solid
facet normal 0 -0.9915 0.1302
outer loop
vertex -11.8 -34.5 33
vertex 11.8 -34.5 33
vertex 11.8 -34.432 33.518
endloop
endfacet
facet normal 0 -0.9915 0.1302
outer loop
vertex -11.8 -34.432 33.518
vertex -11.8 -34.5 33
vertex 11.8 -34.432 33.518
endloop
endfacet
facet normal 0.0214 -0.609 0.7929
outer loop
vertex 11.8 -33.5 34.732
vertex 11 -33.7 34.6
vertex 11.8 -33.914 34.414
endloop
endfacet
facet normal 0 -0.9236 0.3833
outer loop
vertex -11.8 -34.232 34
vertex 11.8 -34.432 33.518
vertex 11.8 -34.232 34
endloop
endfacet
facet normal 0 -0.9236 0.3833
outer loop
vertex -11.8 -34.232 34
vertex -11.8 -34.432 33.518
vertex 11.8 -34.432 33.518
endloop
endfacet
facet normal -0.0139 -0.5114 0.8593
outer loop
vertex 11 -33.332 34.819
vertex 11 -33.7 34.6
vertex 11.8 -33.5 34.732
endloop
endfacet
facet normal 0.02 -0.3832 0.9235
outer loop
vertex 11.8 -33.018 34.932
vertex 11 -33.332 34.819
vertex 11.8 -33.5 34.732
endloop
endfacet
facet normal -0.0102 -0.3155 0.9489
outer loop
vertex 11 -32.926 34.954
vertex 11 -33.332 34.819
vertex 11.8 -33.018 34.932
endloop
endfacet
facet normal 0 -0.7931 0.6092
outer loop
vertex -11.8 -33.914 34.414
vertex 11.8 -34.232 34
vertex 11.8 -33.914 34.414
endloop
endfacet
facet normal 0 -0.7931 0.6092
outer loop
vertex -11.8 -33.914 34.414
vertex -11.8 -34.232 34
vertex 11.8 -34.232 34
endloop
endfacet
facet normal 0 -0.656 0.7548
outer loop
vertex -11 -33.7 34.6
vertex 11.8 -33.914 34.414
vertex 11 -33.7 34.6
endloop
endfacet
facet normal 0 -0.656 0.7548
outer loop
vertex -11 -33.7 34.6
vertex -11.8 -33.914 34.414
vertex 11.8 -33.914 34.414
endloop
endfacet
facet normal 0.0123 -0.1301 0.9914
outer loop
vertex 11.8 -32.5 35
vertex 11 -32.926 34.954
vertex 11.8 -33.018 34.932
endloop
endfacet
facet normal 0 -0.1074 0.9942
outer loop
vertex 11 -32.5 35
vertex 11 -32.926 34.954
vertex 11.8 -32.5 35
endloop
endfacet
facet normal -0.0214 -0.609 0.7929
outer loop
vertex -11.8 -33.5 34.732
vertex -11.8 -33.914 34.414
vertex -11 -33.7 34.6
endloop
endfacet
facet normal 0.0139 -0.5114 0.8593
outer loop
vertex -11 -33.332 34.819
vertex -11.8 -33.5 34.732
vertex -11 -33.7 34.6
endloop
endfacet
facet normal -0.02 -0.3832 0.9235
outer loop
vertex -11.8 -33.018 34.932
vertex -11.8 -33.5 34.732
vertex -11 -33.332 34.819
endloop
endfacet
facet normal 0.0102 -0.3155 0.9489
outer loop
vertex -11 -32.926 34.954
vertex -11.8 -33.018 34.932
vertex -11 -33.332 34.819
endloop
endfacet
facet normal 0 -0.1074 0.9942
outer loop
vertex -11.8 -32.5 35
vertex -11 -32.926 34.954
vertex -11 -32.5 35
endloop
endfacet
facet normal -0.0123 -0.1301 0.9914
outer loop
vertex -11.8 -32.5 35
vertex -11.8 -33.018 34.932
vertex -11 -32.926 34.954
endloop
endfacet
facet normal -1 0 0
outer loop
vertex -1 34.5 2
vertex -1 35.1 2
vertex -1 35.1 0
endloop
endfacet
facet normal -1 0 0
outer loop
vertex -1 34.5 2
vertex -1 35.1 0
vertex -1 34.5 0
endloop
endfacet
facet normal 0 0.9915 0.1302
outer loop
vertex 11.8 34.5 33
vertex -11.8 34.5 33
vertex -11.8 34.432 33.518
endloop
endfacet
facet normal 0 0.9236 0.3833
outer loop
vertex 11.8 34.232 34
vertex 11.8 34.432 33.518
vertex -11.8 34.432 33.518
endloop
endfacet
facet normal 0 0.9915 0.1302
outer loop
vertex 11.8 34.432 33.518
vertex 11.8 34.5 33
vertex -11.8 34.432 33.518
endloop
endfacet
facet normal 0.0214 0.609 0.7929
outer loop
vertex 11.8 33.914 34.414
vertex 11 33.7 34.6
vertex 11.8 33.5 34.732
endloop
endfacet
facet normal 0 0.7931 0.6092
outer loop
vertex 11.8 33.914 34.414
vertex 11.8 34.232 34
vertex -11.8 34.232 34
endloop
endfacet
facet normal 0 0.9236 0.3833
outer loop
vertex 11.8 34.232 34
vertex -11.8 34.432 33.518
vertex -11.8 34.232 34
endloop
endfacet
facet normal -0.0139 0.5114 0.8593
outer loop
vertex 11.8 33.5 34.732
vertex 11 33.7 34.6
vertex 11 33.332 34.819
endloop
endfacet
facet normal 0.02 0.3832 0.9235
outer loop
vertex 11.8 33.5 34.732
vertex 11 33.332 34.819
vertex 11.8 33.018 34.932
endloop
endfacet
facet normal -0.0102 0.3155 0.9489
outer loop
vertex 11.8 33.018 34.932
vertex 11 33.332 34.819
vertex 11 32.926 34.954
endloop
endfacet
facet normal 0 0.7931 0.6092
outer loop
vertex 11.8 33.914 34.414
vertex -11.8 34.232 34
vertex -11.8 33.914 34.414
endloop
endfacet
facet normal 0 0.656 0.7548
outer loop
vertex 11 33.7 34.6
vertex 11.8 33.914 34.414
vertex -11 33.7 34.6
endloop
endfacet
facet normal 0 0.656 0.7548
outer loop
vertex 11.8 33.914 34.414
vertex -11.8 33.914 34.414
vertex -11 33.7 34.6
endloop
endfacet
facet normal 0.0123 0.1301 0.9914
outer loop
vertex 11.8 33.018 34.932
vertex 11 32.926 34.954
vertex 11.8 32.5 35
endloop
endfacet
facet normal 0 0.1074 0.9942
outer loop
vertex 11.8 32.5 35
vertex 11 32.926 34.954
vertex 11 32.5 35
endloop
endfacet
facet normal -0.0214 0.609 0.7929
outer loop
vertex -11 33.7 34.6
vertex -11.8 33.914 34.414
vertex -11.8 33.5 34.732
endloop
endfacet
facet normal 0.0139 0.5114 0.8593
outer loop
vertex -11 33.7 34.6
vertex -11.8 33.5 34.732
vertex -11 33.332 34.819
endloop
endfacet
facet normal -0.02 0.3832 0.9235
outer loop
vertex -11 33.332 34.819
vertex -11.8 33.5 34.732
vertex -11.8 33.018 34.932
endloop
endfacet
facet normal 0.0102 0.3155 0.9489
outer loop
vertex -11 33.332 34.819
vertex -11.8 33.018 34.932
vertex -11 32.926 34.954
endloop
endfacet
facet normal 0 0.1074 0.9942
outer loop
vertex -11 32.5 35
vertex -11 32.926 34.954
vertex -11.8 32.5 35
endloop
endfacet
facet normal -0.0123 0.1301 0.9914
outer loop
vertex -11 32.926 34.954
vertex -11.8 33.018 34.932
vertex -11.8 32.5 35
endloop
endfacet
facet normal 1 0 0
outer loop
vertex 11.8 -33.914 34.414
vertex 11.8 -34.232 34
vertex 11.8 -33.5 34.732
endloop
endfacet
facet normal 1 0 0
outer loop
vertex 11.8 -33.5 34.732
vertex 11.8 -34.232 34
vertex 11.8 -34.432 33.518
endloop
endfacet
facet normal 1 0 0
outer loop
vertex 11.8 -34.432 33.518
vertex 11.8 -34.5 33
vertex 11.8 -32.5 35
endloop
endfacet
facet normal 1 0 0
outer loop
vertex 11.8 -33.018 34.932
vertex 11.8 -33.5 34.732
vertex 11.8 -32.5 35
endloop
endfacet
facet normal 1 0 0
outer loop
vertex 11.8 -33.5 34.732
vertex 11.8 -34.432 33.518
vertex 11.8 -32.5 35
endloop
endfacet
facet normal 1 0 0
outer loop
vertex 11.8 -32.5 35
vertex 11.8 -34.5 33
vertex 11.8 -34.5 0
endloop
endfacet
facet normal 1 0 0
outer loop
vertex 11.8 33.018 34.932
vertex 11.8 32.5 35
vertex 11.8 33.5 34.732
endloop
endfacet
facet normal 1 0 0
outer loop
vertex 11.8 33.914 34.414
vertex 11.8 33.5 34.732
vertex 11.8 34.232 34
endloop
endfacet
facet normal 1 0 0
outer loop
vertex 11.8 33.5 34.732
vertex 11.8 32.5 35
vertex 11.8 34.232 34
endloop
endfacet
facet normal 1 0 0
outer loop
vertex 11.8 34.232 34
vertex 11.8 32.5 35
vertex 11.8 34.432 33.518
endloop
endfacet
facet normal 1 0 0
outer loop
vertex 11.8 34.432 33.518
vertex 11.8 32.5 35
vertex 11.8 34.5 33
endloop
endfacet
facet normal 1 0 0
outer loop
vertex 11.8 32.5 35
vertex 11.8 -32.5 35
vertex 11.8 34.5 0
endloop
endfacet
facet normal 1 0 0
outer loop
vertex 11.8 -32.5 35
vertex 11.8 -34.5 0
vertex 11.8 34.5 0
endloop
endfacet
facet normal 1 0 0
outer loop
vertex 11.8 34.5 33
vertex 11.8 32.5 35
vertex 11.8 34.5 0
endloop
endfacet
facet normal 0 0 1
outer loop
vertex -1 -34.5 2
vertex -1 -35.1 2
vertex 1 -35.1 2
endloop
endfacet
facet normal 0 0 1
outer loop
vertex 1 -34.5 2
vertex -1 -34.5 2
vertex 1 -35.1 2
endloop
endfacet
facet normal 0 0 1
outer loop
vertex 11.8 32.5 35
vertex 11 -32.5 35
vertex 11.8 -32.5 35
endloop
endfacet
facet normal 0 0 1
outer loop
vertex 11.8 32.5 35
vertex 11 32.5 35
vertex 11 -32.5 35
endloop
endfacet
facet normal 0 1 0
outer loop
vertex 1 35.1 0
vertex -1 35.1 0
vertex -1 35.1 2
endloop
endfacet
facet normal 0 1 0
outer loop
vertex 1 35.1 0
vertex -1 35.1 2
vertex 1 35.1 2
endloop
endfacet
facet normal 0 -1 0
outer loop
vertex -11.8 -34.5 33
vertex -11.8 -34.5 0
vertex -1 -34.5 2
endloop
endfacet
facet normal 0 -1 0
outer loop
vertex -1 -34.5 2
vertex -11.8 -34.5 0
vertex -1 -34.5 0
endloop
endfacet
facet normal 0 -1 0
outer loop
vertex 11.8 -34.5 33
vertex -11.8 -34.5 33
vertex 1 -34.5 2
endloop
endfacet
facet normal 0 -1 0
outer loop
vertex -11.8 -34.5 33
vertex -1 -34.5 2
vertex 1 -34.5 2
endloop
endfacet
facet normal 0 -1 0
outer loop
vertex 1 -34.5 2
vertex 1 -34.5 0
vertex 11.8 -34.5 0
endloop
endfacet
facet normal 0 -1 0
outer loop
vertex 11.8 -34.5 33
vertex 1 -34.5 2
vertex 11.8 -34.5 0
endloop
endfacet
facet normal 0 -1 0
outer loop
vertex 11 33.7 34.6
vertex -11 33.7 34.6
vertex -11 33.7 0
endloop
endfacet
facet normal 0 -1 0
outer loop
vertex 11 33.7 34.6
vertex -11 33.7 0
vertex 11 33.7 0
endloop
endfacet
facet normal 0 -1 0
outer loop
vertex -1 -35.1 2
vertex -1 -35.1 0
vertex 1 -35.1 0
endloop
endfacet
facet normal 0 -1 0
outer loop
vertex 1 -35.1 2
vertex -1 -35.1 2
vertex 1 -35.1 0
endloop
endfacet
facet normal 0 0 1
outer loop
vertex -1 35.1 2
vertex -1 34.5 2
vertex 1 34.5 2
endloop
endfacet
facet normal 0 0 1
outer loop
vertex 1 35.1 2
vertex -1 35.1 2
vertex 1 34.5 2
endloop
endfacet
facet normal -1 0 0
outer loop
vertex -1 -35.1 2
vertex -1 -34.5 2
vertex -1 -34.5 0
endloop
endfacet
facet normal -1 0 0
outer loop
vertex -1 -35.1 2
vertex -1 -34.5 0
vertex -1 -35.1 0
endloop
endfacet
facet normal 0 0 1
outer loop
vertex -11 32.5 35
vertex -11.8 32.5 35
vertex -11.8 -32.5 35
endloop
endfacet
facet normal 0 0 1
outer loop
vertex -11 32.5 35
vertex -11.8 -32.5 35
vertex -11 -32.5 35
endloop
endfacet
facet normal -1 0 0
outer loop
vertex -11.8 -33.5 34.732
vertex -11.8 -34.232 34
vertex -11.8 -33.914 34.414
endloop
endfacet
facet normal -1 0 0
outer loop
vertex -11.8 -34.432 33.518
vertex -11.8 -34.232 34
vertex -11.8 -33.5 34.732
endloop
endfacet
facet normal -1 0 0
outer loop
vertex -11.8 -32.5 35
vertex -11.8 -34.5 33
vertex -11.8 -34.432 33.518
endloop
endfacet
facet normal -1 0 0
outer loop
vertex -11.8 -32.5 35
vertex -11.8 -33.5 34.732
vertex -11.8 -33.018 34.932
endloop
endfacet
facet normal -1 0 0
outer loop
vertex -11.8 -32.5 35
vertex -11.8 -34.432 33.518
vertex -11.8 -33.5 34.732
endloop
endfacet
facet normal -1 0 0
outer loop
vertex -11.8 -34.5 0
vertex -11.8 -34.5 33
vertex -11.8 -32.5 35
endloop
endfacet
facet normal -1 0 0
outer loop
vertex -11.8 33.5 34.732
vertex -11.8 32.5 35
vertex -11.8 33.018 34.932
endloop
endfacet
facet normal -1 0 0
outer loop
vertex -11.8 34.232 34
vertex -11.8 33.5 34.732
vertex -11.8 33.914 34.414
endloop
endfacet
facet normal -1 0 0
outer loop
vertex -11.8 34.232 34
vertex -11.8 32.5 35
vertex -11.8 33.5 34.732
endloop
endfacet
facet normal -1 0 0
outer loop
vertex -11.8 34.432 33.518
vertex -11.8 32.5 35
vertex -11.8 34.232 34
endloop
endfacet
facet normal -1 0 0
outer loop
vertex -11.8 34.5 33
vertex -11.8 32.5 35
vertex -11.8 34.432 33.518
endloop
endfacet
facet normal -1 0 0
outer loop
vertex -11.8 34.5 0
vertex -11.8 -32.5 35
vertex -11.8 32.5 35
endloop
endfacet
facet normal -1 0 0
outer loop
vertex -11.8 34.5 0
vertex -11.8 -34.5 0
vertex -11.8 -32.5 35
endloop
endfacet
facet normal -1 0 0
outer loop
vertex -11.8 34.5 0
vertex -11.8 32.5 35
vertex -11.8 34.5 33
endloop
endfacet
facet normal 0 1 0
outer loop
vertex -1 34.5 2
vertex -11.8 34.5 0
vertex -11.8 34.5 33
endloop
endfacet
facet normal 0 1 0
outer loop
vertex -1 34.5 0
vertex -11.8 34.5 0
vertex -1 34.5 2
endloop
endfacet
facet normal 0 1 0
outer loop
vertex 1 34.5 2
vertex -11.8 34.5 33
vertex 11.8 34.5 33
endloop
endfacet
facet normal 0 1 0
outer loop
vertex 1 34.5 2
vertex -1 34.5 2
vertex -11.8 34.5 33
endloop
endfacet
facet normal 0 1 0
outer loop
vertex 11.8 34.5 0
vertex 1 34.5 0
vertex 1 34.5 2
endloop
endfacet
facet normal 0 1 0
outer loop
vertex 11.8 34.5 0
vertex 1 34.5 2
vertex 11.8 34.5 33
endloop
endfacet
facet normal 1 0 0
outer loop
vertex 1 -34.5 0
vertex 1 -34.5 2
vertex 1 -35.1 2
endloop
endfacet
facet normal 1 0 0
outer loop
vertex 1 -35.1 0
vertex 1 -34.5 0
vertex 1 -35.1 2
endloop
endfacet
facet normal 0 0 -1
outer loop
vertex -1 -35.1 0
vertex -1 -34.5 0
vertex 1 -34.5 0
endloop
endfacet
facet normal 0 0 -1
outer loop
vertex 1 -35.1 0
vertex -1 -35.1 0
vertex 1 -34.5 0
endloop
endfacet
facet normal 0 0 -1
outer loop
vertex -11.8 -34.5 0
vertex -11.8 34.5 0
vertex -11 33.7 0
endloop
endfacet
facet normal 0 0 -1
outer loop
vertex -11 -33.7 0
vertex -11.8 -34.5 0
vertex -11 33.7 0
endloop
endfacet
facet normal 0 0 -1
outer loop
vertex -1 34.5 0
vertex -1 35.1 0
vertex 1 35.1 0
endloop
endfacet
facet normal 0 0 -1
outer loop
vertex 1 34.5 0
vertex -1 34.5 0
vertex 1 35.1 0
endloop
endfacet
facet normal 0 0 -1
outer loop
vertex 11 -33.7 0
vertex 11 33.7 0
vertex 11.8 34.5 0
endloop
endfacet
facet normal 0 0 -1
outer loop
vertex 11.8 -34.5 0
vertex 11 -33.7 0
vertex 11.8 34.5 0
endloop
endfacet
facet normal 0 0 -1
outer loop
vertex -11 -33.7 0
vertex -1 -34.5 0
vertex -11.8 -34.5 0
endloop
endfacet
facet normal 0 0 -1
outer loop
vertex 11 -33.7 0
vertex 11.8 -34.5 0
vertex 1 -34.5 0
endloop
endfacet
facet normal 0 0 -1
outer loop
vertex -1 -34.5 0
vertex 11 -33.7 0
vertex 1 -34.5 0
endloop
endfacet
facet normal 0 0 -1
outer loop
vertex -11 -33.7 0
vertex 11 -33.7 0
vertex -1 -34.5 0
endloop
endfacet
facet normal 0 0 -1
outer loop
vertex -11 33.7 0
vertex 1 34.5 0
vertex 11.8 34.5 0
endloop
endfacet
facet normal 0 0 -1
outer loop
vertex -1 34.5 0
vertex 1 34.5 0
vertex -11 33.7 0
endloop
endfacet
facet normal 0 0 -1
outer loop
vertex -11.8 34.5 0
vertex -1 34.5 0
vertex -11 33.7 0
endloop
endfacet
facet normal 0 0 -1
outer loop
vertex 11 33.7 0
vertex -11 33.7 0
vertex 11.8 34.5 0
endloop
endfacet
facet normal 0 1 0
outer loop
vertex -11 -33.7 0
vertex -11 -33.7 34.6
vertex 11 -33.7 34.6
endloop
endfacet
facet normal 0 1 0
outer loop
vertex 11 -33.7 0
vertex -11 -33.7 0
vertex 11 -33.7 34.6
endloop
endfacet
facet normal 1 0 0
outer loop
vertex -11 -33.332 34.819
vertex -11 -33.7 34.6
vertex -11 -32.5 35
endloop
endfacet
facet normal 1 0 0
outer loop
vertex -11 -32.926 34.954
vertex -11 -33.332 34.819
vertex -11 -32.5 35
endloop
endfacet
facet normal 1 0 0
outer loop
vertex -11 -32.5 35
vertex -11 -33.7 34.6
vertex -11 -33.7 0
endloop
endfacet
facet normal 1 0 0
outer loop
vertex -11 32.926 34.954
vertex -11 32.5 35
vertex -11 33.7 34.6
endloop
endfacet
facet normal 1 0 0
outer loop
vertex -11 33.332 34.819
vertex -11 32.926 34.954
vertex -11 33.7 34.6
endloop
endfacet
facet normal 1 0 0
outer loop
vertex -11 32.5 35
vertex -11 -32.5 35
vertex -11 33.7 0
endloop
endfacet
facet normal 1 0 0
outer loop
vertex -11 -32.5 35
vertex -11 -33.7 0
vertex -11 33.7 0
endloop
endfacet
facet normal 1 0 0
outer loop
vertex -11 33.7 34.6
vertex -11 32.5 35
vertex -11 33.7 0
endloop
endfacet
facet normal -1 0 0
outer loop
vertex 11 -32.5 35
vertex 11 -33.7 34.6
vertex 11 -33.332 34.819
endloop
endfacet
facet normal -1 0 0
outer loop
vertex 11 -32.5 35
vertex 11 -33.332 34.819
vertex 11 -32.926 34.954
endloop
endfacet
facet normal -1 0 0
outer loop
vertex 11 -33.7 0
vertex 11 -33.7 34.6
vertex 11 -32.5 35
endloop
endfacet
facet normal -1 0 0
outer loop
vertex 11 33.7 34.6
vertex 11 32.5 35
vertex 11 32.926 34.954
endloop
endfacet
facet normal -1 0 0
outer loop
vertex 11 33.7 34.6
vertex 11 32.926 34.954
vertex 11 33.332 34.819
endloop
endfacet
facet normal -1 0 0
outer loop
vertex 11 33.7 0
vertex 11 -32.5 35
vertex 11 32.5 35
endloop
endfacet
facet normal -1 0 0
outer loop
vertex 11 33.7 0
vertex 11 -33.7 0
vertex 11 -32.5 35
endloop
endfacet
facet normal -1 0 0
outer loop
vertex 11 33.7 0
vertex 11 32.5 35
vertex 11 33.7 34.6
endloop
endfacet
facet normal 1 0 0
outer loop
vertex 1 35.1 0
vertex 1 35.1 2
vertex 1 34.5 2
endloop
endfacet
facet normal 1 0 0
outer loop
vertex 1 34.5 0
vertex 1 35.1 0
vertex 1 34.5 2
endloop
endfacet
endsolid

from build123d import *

# Parameters (mm, degrees)
F0_W        = 23.6
F0_H        = 69
F0_W_2      = 22
F0_H_2      = 67.4
F1_DEPTH    = 35
F2_T1_DEPTH = 33.6
F3_W        = 2
F3_H        = 0.6
F4_DEPTH    = 2


# Not quite as in the source:
# - a fillet or chamfer that OpenCascade refuses, or shapes differently, is made with other operations: its cross-section is extruded or revolved along the edge and cut away or added


with BuildPart() as f1:
    # F0 (on Top) → F1 (new body)
    with BuildSketch(Plane.XY):
        Rectangle(F0_W, F0_H)
        Rectangle(F0_W_2, F0_H_2, mode=Mode.SUBTRACT)
    extrude(amount=F1_DEPTH)

    # F2: fillet of radius 2 on 2 edges, made by hand

    # F2_s2 → F2_t1 (cut)
    with BuildSketch(Plane.YZ.offset(-16.8)):
        with BuildLine():
            ThreePointArc((-34.5, 33), (-33.9142135624, 34.4142135624), (-32.5, 35))
            Line((-32.5, 35), (-34.5, 35))
            Line((-34.5, 35), (-34.5, 33))
        make_face()
        with BuildLine():
            ThreePointArc((34.5, 33), (33.9142135624, 34.4142135624), (32.5, 35))
            Line((32.5, 35), (34.5, 35))
            Line((34.5, 35), (34.5, 33))
        make_face()
    extrude(amount=F2_T1_DEPTH, mode=Mode.SUBTRACT)

    # F3 (on face) → F4 (join)
    with BuildSketch(Plane(origin=(0, 0, 0), x_dir=(1, 0, 0), z_dir=(0, 0, -1))):
        with Locations((0, 34.8)):
            Rectangle(F3_W, F3_H)
        with Locations((0, -34.8)):
            Rectangle(F3_W, F3_H)
    extrude(amount=-F4_DEPTH)


solid = f1.part
